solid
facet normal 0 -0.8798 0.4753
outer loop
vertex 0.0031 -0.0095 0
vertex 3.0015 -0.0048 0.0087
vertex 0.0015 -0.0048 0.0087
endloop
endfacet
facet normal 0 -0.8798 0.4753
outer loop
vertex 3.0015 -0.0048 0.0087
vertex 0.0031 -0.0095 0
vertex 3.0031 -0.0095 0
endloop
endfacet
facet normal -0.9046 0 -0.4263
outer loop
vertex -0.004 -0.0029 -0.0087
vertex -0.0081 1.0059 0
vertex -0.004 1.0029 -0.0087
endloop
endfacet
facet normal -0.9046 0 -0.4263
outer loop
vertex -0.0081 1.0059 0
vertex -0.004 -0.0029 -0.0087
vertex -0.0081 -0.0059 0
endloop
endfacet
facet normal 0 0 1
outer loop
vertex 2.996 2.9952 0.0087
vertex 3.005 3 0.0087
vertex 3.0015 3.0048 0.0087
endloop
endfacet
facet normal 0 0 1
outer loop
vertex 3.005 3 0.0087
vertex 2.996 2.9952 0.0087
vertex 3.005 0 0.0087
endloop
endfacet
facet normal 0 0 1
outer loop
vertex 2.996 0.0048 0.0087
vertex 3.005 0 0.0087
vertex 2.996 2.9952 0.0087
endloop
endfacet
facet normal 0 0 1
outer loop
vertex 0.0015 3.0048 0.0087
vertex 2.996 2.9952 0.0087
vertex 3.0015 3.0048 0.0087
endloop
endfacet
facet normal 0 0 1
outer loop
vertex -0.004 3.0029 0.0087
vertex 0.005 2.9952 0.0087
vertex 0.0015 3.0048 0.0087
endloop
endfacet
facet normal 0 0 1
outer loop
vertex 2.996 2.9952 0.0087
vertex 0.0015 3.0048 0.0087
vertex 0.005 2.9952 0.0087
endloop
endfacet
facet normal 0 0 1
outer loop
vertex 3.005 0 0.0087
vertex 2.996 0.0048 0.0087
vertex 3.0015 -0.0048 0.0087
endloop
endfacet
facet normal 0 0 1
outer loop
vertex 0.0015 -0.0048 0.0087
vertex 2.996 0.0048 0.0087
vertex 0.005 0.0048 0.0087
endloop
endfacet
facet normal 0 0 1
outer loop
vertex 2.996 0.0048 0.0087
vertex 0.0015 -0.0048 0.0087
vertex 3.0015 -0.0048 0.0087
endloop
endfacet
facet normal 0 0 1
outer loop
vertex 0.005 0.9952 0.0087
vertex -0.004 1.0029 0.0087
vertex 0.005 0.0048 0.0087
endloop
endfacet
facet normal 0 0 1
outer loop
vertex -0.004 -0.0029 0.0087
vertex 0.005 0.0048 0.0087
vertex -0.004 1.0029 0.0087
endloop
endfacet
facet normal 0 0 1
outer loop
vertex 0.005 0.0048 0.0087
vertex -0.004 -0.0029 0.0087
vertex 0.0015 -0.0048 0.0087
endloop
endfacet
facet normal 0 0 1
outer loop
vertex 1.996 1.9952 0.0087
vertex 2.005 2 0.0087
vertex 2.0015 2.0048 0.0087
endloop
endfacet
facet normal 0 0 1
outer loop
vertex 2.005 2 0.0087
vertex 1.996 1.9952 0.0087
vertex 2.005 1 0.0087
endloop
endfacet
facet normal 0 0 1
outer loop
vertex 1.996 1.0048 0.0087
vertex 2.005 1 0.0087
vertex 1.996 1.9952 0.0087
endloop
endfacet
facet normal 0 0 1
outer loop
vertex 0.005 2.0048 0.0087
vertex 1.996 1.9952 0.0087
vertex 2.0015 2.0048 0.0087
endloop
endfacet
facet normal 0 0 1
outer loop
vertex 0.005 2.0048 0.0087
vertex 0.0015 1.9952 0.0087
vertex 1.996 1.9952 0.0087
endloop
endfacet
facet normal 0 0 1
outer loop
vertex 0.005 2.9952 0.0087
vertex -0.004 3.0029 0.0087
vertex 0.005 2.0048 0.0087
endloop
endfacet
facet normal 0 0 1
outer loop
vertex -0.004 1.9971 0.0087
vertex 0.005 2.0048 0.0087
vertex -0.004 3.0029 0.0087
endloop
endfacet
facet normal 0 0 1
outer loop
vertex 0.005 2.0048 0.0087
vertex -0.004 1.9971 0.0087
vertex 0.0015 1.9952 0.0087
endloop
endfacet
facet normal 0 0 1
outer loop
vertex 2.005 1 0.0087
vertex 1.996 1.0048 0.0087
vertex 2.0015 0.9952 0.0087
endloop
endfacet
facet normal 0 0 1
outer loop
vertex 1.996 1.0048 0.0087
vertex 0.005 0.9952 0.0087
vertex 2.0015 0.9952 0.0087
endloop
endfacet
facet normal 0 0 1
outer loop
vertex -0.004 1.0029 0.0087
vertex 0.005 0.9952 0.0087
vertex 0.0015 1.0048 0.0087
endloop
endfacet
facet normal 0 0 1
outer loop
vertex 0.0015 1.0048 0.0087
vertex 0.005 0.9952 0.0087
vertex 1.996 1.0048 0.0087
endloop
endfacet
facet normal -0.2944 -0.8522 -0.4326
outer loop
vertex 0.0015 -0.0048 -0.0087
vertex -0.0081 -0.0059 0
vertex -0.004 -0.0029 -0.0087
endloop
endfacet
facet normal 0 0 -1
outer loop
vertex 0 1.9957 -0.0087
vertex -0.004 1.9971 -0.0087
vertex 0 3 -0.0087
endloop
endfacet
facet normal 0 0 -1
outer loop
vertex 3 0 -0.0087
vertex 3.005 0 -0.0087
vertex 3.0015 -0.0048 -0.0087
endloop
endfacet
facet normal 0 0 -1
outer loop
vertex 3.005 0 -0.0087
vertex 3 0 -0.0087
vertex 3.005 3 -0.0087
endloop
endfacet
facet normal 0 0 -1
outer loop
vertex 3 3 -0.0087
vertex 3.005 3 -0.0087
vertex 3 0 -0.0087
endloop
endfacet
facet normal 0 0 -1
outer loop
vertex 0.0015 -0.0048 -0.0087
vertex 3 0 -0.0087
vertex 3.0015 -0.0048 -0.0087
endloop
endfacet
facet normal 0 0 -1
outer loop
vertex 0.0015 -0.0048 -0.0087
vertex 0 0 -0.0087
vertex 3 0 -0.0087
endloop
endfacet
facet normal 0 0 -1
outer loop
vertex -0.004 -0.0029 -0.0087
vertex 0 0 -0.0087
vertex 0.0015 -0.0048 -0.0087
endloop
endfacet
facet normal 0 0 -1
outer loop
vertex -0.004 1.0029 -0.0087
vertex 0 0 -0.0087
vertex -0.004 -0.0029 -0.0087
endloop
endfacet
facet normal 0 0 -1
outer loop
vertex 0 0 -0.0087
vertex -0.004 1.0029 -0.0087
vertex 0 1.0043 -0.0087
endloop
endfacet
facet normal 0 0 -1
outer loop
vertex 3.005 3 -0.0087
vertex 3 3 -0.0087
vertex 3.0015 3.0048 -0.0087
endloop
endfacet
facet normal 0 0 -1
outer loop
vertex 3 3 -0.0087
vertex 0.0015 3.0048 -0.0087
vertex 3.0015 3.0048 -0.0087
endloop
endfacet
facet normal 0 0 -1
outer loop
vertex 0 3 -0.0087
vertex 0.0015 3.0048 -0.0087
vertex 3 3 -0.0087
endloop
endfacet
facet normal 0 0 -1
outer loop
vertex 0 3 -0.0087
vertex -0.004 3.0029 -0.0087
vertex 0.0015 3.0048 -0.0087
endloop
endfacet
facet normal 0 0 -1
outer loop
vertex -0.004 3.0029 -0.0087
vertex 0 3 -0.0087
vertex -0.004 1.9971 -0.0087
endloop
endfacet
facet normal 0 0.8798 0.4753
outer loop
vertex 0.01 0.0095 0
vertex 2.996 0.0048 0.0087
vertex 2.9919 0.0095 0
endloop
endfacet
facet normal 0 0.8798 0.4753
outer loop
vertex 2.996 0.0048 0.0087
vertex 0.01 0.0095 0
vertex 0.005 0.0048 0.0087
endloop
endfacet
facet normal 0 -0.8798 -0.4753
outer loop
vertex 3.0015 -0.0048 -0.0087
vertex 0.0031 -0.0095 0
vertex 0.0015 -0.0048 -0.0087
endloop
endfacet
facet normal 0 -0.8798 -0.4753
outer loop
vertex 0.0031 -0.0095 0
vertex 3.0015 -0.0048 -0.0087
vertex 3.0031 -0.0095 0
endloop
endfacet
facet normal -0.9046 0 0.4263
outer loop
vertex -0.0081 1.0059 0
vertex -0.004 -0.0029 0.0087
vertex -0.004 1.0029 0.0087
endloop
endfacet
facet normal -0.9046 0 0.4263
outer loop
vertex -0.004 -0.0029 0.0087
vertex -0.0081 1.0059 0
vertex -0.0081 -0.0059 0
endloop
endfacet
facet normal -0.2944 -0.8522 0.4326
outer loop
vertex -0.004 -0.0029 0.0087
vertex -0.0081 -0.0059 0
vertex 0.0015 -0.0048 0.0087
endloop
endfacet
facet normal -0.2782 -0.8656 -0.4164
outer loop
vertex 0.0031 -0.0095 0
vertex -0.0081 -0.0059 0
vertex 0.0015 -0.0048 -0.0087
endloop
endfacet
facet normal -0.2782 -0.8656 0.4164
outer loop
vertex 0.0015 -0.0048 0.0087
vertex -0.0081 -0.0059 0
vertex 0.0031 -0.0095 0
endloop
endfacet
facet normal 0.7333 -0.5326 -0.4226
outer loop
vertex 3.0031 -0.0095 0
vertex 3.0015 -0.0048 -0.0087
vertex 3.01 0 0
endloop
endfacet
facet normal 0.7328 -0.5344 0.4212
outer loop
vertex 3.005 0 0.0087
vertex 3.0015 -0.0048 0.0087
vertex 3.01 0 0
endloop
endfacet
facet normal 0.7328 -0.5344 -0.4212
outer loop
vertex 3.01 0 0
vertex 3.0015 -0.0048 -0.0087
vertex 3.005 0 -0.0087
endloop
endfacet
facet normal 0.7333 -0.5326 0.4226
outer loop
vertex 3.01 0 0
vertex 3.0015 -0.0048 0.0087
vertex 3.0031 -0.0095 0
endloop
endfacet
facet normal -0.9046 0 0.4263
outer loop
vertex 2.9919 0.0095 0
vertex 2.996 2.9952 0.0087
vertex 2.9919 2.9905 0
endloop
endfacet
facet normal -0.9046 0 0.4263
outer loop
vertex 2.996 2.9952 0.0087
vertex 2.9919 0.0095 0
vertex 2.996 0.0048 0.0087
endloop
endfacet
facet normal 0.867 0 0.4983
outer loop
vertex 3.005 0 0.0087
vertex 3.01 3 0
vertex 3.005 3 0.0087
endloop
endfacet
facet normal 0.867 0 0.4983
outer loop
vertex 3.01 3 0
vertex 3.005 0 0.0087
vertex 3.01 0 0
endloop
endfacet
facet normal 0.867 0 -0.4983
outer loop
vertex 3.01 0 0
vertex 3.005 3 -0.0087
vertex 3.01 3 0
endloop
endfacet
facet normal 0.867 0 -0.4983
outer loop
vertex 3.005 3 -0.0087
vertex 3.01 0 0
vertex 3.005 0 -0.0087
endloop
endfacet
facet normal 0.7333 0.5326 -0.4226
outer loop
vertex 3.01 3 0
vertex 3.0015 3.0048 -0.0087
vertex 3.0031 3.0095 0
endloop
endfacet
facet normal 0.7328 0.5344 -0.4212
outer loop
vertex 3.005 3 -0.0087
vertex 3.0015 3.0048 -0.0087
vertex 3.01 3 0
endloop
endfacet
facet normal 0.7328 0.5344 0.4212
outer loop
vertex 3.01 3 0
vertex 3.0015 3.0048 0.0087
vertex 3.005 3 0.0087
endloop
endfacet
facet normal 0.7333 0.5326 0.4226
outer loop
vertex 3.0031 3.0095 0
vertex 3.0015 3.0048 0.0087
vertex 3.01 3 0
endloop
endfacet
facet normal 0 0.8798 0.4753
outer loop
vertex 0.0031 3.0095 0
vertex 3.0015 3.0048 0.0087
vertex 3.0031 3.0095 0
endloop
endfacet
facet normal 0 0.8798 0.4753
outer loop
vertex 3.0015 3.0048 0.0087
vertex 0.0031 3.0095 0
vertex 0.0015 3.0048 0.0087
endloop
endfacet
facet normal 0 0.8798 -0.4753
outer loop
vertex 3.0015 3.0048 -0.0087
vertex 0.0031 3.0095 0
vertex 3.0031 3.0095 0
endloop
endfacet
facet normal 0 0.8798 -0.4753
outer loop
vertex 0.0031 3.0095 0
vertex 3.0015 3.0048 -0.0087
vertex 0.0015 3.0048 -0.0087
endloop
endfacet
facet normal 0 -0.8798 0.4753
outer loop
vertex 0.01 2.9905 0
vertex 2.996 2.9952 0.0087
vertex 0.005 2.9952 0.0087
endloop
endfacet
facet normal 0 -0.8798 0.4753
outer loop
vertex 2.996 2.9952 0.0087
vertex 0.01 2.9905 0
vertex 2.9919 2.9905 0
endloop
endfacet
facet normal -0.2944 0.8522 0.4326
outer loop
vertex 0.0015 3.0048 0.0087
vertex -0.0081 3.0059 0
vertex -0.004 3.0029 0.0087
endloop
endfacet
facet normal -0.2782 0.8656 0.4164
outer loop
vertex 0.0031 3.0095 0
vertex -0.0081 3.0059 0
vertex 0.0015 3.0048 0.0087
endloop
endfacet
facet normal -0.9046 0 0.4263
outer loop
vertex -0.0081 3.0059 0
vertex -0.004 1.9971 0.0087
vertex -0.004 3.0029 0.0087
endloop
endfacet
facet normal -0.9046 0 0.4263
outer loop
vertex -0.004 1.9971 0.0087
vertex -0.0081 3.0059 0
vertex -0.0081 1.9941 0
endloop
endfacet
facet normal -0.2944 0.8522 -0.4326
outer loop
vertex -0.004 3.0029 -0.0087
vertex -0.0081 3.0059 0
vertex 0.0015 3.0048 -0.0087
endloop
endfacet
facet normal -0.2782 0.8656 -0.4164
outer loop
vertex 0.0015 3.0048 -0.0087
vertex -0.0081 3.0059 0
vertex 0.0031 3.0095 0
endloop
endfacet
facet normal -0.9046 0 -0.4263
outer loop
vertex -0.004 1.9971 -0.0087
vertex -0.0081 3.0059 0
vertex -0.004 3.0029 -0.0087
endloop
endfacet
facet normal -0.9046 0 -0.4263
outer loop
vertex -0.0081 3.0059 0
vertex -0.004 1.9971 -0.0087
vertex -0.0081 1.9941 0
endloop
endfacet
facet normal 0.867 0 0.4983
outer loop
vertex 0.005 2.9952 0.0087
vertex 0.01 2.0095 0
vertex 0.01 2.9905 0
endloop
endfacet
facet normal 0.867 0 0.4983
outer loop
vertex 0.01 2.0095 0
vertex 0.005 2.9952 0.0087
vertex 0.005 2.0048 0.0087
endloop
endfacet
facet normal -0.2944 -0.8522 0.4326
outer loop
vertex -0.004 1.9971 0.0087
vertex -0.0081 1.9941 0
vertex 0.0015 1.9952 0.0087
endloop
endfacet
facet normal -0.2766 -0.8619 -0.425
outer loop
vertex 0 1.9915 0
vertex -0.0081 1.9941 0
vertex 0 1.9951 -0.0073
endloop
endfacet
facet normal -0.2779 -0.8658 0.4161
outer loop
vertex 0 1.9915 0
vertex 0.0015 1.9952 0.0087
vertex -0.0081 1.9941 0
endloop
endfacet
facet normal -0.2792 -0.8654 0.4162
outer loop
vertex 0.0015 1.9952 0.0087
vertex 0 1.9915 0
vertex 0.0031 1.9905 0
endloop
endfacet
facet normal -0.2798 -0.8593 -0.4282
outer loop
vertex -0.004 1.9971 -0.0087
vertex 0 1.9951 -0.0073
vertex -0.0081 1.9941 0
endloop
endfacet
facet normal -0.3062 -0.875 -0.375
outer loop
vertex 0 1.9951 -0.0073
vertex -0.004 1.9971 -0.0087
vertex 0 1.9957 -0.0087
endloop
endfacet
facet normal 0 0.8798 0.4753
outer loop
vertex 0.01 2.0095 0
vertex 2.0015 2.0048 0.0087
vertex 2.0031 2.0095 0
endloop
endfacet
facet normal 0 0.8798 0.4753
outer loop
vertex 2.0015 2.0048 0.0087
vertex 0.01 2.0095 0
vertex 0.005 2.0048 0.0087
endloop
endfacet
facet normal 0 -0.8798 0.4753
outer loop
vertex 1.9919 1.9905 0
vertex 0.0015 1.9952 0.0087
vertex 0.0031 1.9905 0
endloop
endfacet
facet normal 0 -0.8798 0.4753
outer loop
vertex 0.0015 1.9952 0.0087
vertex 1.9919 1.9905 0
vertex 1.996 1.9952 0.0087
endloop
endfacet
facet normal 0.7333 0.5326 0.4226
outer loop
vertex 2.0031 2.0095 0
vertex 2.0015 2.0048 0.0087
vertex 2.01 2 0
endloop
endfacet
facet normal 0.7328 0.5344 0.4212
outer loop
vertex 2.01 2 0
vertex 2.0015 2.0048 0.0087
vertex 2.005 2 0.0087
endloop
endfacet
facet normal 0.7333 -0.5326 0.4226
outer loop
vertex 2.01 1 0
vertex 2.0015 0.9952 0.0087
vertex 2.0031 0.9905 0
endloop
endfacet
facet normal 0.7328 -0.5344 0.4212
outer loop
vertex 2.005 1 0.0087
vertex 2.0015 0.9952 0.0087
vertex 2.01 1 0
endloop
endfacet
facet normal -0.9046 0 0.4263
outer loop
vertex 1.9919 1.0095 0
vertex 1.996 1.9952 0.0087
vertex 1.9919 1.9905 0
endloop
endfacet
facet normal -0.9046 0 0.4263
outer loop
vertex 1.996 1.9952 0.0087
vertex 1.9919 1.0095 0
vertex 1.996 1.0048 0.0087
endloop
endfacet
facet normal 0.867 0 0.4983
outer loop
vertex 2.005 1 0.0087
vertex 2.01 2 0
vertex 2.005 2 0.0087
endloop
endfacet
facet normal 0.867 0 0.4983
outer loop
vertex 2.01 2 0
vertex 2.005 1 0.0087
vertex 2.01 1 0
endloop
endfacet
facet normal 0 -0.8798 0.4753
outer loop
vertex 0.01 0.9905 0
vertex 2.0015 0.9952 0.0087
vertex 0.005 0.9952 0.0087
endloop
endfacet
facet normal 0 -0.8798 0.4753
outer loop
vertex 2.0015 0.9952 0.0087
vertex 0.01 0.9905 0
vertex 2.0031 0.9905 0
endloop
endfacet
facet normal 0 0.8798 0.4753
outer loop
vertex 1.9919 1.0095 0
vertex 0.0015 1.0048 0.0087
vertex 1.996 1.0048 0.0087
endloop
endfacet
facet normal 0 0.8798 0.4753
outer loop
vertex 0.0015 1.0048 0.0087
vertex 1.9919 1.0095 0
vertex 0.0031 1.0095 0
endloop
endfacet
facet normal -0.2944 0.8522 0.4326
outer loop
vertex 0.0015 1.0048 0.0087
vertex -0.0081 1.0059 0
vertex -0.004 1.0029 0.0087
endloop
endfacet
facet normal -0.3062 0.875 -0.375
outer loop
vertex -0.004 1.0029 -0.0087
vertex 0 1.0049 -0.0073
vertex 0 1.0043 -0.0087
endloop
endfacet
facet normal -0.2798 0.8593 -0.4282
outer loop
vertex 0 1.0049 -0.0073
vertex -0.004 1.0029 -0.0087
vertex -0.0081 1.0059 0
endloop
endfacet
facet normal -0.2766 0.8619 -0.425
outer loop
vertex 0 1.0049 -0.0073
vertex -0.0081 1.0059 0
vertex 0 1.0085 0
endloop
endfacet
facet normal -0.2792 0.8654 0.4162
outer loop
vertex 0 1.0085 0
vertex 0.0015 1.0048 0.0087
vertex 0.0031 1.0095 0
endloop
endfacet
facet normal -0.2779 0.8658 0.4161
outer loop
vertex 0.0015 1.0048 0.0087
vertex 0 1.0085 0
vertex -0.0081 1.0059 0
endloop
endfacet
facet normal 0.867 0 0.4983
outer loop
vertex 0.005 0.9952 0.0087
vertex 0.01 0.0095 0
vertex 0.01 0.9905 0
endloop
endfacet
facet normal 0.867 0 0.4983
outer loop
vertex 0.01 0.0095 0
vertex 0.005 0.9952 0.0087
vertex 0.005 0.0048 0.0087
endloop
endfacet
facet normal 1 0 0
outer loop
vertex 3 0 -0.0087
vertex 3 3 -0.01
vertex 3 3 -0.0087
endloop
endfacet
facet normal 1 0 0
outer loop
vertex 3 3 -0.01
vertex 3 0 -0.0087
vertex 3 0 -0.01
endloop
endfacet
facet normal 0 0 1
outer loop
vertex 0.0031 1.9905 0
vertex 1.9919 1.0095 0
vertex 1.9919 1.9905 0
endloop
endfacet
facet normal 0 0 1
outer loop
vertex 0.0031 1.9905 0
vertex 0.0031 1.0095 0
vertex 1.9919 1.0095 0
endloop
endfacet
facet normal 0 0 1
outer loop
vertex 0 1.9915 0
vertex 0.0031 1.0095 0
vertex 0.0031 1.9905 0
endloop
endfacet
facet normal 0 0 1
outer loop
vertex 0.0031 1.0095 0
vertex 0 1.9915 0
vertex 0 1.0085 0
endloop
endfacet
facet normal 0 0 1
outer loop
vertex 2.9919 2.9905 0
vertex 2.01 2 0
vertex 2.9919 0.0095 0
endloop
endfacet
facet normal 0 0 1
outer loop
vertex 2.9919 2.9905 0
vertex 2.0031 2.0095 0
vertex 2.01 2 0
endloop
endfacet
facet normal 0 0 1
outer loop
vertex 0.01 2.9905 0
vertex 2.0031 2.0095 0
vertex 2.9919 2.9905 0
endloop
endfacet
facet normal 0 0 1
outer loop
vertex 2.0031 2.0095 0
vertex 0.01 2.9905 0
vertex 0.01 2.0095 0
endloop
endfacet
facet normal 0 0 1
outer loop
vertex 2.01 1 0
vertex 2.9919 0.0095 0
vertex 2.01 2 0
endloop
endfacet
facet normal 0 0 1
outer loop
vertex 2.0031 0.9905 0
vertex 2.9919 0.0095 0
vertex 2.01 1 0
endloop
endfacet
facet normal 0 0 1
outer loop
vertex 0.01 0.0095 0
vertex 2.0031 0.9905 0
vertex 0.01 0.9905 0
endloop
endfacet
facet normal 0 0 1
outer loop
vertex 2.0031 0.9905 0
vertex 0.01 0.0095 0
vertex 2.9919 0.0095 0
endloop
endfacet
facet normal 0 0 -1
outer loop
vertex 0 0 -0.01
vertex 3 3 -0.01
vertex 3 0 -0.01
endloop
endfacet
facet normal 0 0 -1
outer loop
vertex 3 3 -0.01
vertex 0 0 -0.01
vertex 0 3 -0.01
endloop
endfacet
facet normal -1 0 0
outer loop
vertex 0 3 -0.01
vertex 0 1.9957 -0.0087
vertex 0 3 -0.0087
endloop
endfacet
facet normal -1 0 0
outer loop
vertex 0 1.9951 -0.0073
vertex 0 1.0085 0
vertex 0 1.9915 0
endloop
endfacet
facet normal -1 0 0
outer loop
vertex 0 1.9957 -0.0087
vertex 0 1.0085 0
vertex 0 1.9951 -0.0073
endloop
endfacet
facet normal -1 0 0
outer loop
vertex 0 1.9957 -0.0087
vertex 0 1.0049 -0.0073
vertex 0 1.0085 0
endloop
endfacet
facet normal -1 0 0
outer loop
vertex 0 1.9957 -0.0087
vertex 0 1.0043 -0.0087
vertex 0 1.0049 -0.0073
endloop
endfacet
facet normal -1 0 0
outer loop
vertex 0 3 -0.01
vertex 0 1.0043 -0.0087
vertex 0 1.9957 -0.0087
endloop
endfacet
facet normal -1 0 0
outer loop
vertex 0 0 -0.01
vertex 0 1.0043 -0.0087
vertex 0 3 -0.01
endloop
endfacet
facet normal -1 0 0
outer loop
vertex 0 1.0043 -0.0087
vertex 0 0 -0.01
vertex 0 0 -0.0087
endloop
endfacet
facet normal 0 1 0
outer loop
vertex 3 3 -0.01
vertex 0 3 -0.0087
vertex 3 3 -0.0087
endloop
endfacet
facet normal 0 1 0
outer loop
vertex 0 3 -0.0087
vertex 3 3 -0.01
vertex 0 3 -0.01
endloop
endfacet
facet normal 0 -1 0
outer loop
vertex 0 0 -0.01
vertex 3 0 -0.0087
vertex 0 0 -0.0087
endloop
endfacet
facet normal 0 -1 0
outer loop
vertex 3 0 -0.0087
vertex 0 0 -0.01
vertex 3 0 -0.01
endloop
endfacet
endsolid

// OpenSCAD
hull(){
    translate([0, 0]) sphere(0.01);
    translate([1, 0]) sphere(0.01);
}
hull(){
    translate([1, 0]) sphere(0.01);
    translate([2, 0]) sphere(0.01);
}
hull(){
    translate([2, 0]) sphere(0.01);
    translate([3, 0]) sphere(0.01);
}
hull(){
    translate([3, 0]) sphere(0.01);
    translate([3, 1]) sphere(0.01);
}
hull(){
    translate([3, 1]) sphere(0.01);
    translate([3, 2]) sphere(0.01);
}
hull(){
    translate([3, 2]) sphere(0.01);
    translate([3, 3]) sphere(0.01);
}
hull(){
    translate([3, 3]) sphere(0.01);
    translate([2, 3]) sphere(0.01);
}
hull(){
    translate([2, 3]) sphere(0.01);
    translate([1, 3]) sphere(0.01);
}
hull(){
    translate([1, 3]) sphere(0.01);
    translate([0, 3]) sphere(0.01);
}
hull(){
    translate([0, 3]) sphere(0.01);
    translate([0, 2]) sphere(0.01);
}
hull(){
    translate([0, 2]) sphere(0.01);
    translate([1, 2]) sphere(0.01);
}
hull(){
    translate([1, 2]) sphere(0.01);
    translate([2, 2]) sphere(0.01);
}
hull(){
    translate([2, 2]) sphere(0.01);
    translate([2, 1]) sphere(0.01);
}
hull(){
    translate([2, 1]) sphere(0.01);
    translate([1, 1]) sphere(0.01);
}
hull(){
    translate([1, 1]) sphere(0.01);
    translate([0, 1]) sphere(0.01);
}
hull(){
    translate([0, 1]) sphere(0.01);
    translate([0, 0]) sphere(0.01);
}
translate([0,0,-0.01]) color([0.1,0.1,0.1]) cube([3,3,0.01]);
